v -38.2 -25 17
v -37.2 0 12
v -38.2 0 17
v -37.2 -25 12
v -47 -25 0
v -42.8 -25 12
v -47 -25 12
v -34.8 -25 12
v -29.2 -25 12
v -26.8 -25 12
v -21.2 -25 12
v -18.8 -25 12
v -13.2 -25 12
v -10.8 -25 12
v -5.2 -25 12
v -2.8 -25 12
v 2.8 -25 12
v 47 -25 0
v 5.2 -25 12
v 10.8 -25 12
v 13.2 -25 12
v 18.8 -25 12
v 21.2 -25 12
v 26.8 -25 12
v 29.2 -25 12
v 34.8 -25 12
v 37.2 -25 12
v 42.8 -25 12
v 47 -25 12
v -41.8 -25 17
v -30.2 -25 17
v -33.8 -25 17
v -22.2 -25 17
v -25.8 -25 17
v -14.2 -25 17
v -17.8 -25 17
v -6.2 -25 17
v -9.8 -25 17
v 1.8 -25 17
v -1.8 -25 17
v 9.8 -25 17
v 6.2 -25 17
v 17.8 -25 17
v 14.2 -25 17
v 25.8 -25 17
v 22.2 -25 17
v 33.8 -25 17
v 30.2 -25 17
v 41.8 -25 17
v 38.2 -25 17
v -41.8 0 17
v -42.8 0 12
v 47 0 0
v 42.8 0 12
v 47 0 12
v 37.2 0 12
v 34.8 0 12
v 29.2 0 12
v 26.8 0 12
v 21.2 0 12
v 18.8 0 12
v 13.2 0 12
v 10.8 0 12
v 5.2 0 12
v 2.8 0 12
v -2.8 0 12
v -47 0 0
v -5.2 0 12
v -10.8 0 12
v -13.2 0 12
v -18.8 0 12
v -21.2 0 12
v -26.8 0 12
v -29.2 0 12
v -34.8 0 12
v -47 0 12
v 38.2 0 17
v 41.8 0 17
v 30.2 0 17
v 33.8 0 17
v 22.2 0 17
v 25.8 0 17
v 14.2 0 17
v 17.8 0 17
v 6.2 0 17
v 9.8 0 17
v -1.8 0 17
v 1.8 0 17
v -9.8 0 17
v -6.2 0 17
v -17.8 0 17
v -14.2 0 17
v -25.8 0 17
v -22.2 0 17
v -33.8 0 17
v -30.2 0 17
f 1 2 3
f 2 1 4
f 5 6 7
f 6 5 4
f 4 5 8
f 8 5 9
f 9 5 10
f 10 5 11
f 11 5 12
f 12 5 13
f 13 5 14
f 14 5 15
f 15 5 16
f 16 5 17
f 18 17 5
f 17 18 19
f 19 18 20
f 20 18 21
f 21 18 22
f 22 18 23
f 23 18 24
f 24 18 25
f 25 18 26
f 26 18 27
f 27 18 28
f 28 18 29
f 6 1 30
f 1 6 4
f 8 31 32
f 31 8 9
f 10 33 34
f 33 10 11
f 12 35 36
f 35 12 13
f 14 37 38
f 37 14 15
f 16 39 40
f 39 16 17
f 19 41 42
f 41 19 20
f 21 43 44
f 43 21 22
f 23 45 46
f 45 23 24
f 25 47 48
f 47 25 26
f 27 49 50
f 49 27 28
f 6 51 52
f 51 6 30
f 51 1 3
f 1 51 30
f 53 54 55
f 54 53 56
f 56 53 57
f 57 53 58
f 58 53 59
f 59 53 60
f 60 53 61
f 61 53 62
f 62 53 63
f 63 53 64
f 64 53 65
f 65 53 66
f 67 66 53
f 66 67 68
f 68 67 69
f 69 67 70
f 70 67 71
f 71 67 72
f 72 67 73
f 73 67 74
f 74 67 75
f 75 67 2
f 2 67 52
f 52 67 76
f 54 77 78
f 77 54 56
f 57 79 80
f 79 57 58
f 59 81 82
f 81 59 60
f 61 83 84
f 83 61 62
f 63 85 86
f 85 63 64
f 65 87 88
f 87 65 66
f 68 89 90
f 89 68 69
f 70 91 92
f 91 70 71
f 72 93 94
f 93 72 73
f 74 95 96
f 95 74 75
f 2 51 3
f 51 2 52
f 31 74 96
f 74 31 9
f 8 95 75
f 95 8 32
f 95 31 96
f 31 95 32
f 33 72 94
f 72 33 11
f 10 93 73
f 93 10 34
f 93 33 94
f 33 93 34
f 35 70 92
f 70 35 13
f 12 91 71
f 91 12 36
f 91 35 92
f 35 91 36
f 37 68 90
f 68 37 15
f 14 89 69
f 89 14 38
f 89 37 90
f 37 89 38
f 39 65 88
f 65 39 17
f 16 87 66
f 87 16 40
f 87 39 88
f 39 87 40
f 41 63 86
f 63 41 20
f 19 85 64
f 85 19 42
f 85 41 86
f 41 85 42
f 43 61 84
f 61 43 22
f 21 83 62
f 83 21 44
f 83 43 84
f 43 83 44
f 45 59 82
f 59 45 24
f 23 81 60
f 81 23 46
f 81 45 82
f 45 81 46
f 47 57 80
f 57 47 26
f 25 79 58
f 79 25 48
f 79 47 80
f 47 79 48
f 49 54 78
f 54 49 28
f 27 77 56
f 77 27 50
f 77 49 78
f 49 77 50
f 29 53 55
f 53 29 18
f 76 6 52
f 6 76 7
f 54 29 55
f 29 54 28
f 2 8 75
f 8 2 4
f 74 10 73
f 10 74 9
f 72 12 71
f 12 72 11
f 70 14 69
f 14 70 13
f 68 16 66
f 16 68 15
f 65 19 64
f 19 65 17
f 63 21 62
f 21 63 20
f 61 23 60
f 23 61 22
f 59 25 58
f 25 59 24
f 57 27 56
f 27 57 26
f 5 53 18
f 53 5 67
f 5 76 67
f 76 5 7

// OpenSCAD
$fn = 32;

// ----------------------------------------------------------------------
// Toothed rack, 11 teeth
// 8 mm pitch, 5 mm teeth
// ----------------------------------------------------------------------

// --- parameters (mm) ---
bar_w = 25;     // bar width (Y)
bar_h = 12;     // bar height (Z)
teeth = 11;     // number of teeth
pitch = 8;      // tooth pitch
tooth_h = 5;    // tooth height above the bar
root_w = 6;     // tooth width at the root
crest_w = 3.6;  // tooth width at the crest

// --- derived feature positions (mm) ---
span = (teeth - 1) * pitch;  // = 80   distance between the outer teeth
bar_l = span + root_w + 8;   // = 94   bar length: teeth plus 4 mm at each end
tooth_x = -span / 2;         // = -40   X of the first tooth
height = bar_h + tooth_h;    // = 17   overall height
feature_centers = [
  [tooth_x + 0 * pitch, -bar_w / 2],
  [tooth_x + 1 * pitch, -bar_w / 2],
  [tooth_x + 2 * pitch, -bar_w / 2],
  [tooth_x + 3 * pitch, -bar_w / 2],
  [tooth_x + 4 * pitch, -bar_w / 2],
  [tooth_x + 5 * pitch, -bar_w / 2],
  [tooth_x + 6 * pitch, -bar_w / 2],
  [tooth_x + 7 * pitch, -bar_w / 2],
  [tooth_x + 8 * pitch, -bar_w / 2],
  [tooth_x + 9 * pitch, -bar_w / 2],
  [tooth_x + 10 * pitch, -bar_w / 2]
];   // tooth centre line, drives the tooth loop

// bar with a rack of teeth, one extruded trapezoium per centre
module rack_tooth() {
  linear_extrude(height = bar_w)
    polygon(points = [
      [0, 0],
      [root_w, 0],
      [root_w / 2 + crest_w / 2, tooth_h + 1],
      [root_w / 2 - crest_w / 2, tooth_h + 1]
    ]);
}

union() {
  translate([-bar_l / 2, -bar_w, 0]) cube([bar_l, bar_w, bar_h]);
  for (centre = feature_centers)
    translate([centre[0] - root_w / 2, 0, bar_h - 1]) rotate([90, 0, 0]) rack_tooth();
}
